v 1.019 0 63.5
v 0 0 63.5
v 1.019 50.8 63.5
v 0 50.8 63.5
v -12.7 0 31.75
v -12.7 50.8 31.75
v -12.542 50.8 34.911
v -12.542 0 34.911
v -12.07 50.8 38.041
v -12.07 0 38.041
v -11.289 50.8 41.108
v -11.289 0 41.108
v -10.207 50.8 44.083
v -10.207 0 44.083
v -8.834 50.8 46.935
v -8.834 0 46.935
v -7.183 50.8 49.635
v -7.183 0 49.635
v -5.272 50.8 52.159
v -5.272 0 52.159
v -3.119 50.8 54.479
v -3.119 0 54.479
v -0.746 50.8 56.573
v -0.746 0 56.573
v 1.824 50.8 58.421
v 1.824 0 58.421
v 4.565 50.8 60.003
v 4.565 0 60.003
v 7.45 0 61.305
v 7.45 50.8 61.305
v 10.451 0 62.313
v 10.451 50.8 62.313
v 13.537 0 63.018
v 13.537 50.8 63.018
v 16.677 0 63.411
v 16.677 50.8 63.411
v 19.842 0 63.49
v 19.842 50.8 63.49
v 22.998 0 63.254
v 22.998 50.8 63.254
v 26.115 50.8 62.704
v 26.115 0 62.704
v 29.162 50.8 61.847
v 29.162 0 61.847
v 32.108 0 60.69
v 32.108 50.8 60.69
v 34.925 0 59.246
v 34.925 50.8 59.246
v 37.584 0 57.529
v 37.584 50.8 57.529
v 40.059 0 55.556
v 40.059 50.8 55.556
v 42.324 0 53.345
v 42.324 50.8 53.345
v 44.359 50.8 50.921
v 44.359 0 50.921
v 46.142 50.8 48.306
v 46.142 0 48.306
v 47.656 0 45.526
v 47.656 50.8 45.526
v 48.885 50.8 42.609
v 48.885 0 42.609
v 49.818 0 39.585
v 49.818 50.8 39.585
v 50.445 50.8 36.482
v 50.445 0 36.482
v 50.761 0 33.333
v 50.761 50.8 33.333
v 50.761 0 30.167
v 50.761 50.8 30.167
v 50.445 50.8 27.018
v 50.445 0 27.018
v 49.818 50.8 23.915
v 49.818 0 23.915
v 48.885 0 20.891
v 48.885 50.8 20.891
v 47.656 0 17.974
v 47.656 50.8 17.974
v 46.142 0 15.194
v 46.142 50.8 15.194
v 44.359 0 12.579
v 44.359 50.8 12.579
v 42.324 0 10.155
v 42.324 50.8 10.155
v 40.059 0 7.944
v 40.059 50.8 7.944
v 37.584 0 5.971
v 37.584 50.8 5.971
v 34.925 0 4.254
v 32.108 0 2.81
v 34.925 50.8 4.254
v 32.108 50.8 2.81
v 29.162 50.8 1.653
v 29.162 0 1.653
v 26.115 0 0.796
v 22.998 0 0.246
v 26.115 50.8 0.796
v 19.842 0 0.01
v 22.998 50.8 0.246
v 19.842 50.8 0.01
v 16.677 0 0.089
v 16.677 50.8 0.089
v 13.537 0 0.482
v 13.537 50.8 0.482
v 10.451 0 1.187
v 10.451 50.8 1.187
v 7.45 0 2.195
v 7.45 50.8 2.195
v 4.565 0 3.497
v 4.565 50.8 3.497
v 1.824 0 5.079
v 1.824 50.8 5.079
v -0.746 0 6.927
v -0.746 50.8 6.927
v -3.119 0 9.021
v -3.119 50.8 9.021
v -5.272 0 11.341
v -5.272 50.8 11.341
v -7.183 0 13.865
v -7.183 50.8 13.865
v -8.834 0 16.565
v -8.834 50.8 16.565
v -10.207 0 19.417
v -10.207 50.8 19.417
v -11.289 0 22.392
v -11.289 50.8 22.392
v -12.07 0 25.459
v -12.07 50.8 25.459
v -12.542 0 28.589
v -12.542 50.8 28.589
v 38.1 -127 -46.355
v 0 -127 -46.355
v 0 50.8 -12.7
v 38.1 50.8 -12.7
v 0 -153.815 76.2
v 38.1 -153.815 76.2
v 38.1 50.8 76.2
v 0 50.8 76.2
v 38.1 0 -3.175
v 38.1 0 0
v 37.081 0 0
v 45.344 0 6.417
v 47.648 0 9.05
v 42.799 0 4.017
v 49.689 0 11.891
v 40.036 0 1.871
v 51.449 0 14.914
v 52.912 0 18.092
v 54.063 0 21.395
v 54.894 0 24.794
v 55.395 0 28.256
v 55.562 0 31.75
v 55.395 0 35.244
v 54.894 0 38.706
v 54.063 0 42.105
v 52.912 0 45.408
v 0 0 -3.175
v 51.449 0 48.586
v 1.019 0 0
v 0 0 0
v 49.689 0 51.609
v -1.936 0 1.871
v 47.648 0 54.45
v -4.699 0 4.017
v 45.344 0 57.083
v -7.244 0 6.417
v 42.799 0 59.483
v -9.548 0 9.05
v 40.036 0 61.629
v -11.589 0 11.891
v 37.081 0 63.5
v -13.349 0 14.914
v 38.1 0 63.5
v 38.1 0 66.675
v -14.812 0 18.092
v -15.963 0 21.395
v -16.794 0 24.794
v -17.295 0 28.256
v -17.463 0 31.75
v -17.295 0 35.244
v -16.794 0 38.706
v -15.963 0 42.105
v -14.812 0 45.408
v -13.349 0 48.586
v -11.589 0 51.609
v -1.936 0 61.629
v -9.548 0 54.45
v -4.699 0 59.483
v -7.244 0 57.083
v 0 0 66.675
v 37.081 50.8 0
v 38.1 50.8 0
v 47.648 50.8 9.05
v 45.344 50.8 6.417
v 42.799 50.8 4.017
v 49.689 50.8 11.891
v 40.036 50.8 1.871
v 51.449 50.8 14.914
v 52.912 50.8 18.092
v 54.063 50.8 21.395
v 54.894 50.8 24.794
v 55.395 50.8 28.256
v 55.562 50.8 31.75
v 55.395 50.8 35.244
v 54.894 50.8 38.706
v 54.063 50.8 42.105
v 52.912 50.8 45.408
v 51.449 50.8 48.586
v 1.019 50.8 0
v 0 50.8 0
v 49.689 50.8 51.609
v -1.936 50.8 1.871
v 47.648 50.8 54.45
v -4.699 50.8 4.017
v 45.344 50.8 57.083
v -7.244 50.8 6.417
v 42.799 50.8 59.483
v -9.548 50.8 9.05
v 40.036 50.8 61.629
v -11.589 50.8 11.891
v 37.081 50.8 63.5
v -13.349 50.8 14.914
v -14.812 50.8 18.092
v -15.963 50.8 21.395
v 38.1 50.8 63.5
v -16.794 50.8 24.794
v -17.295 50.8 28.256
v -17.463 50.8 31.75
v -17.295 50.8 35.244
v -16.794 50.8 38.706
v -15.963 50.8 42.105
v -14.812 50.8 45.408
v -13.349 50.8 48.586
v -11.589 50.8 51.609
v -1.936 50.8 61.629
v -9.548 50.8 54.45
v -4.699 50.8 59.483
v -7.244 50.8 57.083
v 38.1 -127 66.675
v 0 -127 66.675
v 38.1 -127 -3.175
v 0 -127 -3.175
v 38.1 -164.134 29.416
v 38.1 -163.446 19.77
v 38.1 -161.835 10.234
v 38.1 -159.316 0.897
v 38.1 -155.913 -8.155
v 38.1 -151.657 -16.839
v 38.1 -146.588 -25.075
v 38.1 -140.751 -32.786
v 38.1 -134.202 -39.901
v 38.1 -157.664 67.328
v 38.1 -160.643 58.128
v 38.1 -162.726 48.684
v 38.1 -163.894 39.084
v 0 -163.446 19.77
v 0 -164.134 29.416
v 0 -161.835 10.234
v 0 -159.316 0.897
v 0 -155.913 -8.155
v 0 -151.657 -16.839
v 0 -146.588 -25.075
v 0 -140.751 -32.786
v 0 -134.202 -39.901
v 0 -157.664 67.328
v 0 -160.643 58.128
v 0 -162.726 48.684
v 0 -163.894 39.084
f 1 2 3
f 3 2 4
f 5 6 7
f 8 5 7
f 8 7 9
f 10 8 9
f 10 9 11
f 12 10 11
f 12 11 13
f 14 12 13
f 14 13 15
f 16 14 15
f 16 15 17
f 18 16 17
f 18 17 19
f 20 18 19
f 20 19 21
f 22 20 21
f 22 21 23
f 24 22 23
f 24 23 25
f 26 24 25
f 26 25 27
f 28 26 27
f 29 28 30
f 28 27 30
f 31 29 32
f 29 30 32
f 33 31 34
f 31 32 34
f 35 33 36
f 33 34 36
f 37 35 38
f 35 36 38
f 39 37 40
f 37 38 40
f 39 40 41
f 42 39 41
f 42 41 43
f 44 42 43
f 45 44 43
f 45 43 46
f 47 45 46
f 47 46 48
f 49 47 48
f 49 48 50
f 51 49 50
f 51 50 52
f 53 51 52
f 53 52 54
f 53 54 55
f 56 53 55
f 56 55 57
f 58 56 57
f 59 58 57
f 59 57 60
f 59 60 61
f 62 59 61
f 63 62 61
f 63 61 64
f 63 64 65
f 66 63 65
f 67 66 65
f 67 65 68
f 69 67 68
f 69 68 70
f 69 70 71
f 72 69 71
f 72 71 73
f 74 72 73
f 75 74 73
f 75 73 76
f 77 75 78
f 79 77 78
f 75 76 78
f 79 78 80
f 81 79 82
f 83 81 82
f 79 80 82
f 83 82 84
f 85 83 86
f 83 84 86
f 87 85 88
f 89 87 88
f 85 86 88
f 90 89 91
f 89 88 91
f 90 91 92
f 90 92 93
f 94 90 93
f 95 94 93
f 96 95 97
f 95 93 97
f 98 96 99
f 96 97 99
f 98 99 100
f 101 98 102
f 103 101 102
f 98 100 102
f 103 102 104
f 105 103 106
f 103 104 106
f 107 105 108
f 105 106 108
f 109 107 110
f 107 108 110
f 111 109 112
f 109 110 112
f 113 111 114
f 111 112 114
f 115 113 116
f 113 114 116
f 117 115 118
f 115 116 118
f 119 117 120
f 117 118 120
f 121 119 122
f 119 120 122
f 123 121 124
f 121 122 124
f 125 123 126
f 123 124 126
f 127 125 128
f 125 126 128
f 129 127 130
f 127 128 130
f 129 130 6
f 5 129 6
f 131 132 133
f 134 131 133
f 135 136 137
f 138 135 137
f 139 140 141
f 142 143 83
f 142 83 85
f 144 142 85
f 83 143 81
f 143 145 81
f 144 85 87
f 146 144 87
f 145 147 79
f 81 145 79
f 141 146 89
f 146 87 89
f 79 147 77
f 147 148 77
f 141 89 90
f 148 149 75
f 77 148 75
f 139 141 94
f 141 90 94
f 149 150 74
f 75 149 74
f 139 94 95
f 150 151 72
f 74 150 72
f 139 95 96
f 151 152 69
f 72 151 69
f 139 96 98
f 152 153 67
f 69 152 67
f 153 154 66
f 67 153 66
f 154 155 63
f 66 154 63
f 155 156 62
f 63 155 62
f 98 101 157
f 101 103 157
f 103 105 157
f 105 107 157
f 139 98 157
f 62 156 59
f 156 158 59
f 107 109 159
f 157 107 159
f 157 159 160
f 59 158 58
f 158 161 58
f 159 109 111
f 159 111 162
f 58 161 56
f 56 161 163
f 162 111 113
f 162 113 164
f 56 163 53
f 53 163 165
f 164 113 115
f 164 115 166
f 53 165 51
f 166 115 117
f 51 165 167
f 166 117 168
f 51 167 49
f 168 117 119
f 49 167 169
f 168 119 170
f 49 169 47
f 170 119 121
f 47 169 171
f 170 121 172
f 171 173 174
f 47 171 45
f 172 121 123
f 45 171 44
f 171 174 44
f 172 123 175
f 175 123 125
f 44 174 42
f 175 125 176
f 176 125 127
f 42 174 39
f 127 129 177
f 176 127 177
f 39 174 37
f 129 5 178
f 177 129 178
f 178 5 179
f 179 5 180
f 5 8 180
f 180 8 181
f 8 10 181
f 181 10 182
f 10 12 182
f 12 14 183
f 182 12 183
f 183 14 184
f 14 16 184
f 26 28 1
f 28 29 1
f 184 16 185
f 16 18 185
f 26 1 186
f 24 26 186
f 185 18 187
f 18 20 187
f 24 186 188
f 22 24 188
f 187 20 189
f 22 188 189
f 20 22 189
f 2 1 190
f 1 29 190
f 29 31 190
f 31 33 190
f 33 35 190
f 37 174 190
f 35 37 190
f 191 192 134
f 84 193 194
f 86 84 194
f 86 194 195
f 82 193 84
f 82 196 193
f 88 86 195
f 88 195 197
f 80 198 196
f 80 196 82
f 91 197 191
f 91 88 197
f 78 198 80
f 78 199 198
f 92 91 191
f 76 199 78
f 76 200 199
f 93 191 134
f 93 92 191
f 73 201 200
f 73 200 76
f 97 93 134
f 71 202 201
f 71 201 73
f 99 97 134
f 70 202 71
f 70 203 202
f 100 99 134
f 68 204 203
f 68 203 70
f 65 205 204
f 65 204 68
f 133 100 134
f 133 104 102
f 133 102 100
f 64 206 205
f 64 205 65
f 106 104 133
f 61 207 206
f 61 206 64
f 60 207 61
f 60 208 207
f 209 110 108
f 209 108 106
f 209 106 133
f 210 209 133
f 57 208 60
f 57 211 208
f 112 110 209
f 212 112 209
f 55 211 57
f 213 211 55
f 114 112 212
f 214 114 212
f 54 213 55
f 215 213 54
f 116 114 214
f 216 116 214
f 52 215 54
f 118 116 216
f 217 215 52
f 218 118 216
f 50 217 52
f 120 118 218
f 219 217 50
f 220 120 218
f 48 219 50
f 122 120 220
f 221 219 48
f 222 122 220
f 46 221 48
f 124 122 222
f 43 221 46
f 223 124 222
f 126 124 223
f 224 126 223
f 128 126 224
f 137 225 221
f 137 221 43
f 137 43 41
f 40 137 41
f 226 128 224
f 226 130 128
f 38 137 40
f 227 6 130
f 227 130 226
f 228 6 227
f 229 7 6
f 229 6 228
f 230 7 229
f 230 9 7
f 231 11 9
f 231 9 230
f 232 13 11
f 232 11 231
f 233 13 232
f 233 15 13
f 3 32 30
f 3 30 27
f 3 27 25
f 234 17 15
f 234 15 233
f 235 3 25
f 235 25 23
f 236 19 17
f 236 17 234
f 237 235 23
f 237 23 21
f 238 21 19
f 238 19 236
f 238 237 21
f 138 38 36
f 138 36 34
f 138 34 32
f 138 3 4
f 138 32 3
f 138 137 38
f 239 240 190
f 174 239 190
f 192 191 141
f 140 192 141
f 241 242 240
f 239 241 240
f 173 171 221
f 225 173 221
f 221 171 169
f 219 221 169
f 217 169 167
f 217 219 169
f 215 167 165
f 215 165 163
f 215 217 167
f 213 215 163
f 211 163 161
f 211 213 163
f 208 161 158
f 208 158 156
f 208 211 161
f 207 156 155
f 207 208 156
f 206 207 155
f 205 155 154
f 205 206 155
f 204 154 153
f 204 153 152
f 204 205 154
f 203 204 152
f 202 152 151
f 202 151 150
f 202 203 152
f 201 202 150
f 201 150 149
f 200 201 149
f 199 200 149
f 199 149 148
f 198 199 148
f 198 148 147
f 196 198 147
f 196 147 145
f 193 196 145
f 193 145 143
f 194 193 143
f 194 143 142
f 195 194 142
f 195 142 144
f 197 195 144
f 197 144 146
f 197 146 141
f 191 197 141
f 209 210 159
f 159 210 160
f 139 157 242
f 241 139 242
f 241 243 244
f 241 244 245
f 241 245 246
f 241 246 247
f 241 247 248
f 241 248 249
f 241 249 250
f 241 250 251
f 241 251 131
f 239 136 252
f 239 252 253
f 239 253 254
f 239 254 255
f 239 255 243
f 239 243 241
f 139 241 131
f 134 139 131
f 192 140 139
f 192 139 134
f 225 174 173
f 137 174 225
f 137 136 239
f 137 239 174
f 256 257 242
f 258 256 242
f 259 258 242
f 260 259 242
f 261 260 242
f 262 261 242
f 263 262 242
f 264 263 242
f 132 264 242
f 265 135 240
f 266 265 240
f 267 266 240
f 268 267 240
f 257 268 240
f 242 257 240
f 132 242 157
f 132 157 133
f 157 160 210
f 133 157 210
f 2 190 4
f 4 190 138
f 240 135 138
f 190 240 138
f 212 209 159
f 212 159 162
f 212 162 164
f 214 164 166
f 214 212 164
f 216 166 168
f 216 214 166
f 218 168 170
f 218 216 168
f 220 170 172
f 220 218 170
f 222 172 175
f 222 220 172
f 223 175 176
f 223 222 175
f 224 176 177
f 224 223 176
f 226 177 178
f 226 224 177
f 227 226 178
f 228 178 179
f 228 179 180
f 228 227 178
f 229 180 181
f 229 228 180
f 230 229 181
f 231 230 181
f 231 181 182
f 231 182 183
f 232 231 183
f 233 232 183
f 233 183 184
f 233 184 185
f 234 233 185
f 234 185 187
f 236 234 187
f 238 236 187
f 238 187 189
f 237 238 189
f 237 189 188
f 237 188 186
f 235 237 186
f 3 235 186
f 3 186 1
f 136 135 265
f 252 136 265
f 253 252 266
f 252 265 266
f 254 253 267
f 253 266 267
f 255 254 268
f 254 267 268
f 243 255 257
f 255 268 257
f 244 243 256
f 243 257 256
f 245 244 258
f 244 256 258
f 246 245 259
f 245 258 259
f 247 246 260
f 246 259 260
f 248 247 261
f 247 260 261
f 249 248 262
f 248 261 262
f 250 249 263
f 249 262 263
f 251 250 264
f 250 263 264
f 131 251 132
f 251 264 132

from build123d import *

# Parameters (mm, degrees)
F1_DEPTH = 38.1
F2_R     = 36.5125
F2_R_2   = 31.75
F3_DEPTH = 50.8
F5_DEPTH = 127


with BuildPart() as f1:
    # F0 (on Right) → F1 (new body)
    with BuildSketch(Plane.YZ):
        with BuildLine():
            Line((50.8, 0), (0, 0))
            Line((0, 0), (0, -3.175))
            Line((0, -3.175), (-127, -3.175))
            Line((-127, -3.175), (-127, 66.675))
            Line((-127, 66.675), (0, 66.675))
            Line((0, 66.675), (0, 63.5))
            Line((0, 63.5), (50.8, 63.5))
            Line((50.8, 63.5), (50.8, 76.2))
            Line((50.8, 76.2), (-127, 109.855))
            ThreePointArc((-127, 109.855), (-164.16102, 31.75), (-127, -46.355))
            Line((-127, -46.355), (50.8, -12.7))
            Line((50.8, -12.7), (50.8, 0))
        make_face()
    extrude(amount=F1_DEPTH)

    # F2 (on face) → F3 (join)
    with BuildSketch(Plane(origin=(0, 50.8, 0), x_dir=(-1, 0, 0), z_dir=(0, 1, 0))):
        with Locations((-19.05, 31.75)):
            Circle(F2_R)
        with Locations((-19.05, 31.75)):
            Circle(F2_R_2, mode=Mode.SUBTRACT)
    extrude(amount=-F3_DEPTH)

    # F4 (on face) → F5 (cut)
    with BuildSketch(Plane.YZ.offset(38.1)):
        with BuildLine():
            Line((-153.815218, 76.2), (50.8, 76.2))
            Line((50.8, 76.2), (-127, 109.855))
            ThreePointArc((-127, 109.855), (-142.227029, 94.477155), (-153.815218, 76.2))
        make_face()
    extrude(amount=-F5_DEPTH, mode=Mode.SUBTRACT)


solid = f1.part
